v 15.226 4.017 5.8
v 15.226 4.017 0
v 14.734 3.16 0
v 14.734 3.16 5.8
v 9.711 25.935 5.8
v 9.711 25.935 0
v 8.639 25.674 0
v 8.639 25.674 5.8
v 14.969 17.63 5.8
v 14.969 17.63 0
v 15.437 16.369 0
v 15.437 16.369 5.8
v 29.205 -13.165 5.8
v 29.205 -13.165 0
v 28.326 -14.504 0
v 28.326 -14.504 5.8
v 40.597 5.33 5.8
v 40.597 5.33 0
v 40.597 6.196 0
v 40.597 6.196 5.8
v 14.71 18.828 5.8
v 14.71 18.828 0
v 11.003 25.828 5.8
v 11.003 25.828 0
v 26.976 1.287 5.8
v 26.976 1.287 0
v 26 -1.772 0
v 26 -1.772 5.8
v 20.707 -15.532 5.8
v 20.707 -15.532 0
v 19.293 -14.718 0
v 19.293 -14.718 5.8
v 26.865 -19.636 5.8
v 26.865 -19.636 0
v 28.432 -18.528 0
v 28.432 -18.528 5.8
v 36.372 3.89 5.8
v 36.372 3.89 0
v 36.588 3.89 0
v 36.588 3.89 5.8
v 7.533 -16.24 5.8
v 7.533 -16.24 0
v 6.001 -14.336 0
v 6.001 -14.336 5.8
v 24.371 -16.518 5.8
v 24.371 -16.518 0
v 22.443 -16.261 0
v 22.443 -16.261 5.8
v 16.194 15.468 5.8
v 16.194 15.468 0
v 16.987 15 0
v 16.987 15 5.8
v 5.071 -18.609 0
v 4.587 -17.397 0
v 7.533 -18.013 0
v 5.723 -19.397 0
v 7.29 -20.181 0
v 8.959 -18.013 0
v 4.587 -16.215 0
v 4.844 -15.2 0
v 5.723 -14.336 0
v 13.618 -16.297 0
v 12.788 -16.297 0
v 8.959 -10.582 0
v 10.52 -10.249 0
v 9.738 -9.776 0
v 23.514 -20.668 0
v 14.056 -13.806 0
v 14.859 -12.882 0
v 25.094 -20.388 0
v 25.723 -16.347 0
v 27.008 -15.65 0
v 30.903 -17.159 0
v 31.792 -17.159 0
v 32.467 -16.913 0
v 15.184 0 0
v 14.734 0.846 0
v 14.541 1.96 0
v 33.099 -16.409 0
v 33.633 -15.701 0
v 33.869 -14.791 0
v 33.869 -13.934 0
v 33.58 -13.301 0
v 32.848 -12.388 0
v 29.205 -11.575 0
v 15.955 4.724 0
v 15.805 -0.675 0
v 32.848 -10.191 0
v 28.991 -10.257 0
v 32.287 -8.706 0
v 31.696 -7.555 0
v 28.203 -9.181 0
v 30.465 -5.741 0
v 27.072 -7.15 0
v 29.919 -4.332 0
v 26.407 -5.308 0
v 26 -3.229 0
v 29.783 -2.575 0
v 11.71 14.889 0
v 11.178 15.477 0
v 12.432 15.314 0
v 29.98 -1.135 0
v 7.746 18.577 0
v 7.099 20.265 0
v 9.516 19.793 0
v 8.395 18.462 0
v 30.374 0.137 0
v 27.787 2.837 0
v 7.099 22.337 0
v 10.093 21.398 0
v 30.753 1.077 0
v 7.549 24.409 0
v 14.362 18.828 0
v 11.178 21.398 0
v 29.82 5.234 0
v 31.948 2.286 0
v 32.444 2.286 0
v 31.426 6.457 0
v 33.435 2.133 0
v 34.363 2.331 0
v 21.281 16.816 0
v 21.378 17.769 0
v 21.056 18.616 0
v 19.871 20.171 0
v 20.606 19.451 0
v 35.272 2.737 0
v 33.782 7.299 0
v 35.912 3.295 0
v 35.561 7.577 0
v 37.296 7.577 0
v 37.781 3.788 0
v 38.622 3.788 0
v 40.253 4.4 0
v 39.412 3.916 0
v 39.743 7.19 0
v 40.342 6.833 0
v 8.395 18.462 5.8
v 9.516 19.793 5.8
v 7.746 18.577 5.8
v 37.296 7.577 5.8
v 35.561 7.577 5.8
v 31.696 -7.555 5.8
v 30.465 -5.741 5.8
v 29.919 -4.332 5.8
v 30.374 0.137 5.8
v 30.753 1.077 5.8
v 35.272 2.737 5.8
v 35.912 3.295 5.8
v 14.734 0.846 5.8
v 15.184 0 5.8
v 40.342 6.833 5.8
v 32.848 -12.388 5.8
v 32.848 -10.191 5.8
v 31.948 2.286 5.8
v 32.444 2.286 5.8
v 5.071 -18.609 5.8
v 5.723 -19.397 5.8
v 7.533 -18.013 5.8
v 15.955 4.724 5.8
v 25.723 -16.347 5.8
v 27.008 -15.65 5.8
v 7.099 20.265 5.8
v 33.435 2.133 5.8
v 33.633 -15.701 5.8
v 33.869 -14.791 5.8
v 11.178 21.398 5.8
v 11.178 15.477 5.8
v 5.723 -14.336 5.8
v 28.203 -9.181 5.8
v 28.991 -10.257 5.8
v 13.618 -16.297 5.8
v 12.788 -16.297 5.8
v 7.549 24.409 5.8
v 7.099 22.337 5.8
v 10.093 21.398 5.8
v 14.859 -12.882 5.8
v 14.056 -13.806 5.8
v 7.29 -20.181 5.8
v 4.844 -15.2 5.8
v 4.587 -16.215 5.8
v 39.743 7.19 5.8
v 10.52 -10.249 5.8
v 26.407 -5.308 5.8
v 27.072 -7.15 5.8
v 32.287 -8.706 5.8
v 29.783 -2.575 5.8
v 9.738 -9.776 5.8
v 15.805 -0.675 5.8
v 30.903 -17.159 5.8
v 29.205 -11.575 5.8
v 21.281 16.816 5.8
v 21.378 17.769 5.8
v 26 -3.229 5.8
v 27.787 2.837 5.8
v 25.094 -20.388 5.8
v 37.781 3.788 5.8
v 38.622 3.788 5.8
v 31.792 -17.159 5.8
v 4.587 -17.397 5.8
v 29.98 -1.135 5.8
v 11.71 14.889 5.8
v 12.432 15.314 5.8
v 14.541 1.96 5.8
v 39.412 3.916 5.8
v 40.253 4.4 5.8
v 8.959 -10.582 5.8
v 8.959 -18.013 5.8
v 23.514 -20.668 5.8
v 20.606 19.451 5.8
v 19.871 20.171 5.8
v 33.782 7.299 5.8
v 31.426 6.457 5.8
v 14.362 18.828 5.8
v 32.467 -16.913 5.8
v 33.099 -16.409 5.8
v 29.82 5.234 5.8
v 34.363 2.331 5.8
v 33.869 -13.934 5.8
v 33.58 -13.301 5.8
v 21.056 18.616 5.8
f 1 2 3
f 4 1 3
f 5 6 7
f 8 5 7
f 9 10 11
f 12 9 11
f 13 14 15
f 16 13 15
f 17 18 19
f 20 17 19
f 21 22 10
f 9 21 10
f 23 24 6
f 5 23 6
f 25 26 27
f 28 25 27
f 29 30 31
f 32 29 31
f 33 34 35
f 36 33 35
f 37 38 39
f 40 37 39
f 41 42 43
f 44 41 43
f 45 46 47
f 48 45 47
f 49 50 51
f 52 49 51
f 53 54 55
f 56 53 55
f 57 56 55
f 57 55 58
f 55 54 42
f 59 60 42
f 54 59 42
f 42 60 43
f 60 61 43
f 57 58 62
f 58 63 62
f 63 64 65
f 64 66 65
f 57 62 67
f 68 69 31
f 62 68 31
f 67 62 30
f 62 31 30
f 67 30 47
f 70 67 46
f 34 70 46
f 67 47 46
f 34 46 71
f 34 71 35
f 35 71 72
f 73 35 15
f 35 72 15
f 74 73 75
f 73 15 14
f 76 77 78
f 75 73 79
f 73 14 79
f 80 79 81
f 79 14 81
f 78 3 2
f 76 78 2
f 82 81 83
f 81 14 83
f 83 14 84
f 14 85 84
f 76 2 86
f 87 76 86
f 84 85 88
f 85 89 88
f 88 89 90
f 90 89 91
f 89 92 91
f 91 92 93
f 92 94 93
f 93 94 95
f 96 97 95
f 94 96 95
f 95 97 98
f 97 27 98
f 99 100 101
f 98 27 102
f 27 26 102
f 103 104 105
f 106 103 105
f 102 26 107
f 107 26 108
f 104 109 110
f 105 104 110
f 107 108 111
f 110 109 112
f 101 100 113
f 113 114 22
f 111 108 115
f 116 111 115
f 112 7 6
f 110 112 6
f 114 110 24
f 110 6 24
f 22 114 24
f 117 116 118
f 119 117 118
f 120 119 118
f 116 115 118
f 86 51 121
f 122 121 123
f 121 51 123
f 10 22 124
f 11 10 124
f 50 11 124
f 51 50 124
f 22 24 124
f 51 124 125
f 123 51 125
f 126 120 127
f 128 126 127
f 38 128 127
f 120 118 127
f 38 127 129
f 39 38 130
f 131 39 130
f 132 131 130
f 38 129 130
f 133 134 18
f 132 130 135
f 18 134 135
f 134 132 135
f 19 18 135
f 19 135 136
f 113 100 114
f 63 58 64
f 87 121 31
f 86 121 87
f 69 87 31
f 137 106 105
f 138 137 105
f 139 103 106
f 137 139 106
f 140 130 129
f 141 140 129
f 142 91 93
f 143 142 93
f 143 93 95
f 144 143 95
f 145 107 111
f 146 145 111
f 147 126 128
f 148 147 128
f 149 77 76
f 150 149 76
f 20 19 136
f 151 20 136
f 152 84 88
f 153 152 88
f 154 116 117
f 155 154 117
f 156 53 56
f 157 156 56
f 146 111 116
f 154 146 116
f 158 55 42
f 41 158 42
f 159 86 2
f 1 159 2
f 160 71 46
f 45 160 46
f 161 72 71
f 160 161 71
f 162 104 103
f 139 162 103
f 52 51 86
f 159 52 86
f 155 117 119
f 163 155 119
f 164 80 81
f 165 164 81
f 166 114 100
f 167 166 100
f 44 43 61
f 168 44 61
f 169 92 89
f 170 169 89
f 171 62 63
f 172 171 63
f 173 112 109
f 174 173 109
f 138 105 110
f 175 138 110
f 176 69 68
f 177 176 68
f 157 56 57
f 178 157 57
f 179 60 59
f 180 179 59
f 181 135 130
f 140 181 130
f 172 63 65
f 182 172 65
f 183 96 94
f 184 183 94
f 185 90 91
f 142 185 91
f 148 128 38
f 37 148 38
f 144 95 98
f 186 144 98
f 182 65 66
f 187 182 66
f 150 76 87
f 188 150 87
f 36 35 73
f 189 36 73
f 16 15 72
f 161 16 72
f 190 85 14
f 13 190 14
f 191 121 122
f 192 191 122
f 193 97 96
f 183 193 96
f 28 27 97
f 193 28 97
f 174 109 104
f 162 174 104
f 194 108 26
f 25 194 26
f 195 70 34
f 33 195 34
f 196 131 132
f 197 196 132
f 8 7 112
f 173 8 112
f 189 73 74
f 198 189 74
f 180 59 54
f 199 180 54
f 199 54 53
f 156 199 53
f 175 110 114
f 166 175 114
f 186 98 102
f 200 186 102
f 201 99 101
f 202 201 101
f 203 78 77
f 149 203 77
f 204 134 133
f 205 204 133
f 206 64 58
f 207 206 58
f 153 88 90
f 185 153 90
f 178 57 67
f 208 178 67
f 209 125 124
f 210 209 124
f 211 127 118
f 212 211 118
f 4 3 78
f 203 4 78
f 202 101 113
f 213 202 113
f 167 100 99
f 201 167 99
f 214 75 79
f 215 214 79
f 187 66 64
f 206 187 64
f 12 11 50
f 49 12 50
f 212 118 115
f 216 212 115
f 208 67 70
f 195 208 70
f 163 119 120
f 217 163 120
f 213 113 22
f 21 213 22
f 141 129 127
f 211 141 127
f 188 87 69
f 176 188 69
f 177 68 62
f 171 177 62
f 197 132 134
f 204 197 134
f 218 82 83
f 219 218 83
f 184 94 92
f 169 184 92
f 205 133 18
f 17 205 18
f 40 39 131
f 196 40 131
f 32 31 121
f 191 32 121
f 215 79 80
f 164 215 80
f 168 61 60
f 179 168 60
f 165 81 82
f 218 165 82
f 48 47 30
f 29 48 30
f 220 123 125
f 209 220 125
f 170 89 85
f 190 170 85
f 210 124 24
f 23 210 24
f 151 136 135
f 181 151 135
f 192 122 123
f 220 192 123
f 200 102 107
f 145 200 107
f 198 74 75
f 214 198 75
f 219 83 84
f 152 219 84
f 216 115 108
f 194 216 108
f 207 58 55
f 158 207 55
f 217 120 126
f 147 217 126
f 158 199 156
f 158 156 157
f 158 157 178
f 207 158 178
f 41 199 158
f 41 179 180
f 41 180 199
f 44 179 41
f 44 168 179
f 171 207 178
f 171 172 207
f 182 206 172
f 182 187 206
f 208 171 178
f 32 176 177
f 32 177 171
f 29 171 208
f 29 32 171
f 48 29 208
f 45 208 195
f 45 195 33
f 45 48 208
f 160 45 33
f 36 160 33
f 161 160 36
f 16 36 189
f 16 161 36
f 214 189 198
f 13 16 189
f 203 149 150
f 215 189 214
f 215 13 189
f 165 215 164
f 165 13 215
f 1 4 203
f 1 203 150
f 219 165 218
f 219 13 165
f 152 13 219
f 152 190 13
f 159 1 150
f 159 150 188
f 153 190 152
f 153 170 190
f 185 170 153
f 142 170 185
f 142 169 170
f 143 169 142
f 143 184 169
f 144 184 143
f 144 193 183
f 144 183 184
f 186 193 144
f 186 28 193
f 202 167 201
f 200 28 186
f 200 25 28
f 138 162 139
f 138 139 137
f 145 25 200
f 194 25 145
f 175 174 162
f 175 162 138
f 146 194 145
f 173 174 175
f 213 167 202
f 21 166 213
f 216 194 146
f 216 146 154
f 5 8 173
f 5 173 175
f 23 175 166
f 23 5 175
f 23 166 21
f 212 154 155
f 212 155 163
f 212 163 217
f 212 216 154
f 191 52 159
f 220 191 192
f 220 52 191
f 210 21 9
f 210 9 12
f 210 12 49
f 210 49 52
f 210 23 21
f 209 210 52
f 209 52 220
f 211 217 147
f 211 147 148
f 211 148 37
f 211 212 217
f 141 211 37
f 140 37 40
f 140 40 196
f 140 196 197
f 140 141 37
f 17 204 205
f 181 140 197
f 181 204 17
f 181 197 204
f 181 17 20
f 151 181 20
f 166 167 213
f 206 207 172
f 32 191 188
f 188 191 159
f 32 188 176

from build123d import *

# Parameters (mm, degrees)
F1_DEPTH = 5.8


with BuildPart() as f1:
    # F0 (on Top) → F1 (new body)
    with BuildSketch(Plane.XY):
        Polygon((19.870715, 20.171389), (11.003364, 25.828145), (9.710712, 25.935493), (8.638659, 25.674237), (7.548944, 24.40875), (7.098501, 22.336712), (7.098501, 20.264676), (7.745507, 18.576713), (8.39527, 18.462049), (9.515883, 19.793121), (10.092715, 21.398216), (11.178206, 21.398216), (11.178206, 15.477047), (11.710122, 14.888561), (12.432186, 15.31403), (14.361553, 18.82783), (14.710026, 18.82783), (14.968658, 17.630091), (15.437118, 16.368851), (16.193863, 15.467965), (16.986642, 14.999504), (15.95501, 4.724317), (15.226499, 4.017233), (14.733682, 3.160161), (14.540842, 1.960261), (14.733682, 0.846068), (15.183645, 0), (15.805023, -0.675234), (14.859016, -12.881954), (14.056012, -13.806167), (13.617913, -16.297314), (12.787792, -16.297314), (10.52028, -10.248602), (9.737968, -9.775993), (8.959359, -10.581703), (8.959359, -18.013308), (7.532651, -18.013308), (7.532651, -16.239962), (6.00086, -14.336004), (5.722645, -14.336004), (4.844186, -15.200062), (4.586618, -16.215181), (4.586618, -17.39696), (5.071451, -18.609043), (5.722946, -19.396897), (7.289982, -20.181168), (23.513971, -20.668361), (25.093786, -20.388072), (26.864707, -19.636385), (28.431782, -18.527966), (30.902525, -17.158909), (31.791739, -17.158909), (32.466684, -16.912501), (33.098772, -16.408972), (33.633251, -15.701212), (33.868946, -14.790573), (33.868946, -13.933501), (33.579685, -13.301411), (32.847531, -12.387843), (32.847531, -11.59999), (32.847531, -10.190943), (32.286942, -8.706142), (31.696055, -7.554664), (30.464781, -5.741373), (29.919345, -4.332328), (29.782984, -2.574808), (29.979948, -1.13546), (30.373875, 0.137226), (30.752651, 1.07659), (31.948227, 2.286357), (32.443713, 2.286357), (33.434689, 2.133206), (34.362599, 2.331401), (35.272494, 2.7368), (35.912123, 3.295349), (36.371578, 3.889933), (36.58779, 3.889933), (37.781443, 3.788194), (38.622316, 3.788194), (39.412223, 3.915599), (40.253092, 4.399735), (40.597085, 5.329788), (40.597085, 6.196138), (40.342275, 6.833161), (39.743476, 7.189893), (37.296191, 7.57748), (35.560623, 7.57748), (33.782199, 7.298932), (31.425729, 6.457172), (29.820433, 5.234089), (27.787192, 2.836954), (26.976394, 1.287431), (26.000202, -1.772101), (26.000202, -3.229123), (26.407311, -5.307521), (27.071541, -7.150225), (28.203402, -9.181112), (28.991256, -10.256835), (29.204722, -11.574975), (29.204722, -13.16472), (28.326225, -14.503894), (27.008476, -15.650228), (25.722869, -16.346598), (24.370953, -16.518012), (22.442544, -16.26089), (20.706974, -15.53238), (19.292805, -14.718162), (21.281268, 16.815733), (21.37769, 17.769225), (21.056287, 18.615583), (20.606324, 19.451229), align=None)
    extrude(amount=F1_DEPTH)


solid = f1.part
